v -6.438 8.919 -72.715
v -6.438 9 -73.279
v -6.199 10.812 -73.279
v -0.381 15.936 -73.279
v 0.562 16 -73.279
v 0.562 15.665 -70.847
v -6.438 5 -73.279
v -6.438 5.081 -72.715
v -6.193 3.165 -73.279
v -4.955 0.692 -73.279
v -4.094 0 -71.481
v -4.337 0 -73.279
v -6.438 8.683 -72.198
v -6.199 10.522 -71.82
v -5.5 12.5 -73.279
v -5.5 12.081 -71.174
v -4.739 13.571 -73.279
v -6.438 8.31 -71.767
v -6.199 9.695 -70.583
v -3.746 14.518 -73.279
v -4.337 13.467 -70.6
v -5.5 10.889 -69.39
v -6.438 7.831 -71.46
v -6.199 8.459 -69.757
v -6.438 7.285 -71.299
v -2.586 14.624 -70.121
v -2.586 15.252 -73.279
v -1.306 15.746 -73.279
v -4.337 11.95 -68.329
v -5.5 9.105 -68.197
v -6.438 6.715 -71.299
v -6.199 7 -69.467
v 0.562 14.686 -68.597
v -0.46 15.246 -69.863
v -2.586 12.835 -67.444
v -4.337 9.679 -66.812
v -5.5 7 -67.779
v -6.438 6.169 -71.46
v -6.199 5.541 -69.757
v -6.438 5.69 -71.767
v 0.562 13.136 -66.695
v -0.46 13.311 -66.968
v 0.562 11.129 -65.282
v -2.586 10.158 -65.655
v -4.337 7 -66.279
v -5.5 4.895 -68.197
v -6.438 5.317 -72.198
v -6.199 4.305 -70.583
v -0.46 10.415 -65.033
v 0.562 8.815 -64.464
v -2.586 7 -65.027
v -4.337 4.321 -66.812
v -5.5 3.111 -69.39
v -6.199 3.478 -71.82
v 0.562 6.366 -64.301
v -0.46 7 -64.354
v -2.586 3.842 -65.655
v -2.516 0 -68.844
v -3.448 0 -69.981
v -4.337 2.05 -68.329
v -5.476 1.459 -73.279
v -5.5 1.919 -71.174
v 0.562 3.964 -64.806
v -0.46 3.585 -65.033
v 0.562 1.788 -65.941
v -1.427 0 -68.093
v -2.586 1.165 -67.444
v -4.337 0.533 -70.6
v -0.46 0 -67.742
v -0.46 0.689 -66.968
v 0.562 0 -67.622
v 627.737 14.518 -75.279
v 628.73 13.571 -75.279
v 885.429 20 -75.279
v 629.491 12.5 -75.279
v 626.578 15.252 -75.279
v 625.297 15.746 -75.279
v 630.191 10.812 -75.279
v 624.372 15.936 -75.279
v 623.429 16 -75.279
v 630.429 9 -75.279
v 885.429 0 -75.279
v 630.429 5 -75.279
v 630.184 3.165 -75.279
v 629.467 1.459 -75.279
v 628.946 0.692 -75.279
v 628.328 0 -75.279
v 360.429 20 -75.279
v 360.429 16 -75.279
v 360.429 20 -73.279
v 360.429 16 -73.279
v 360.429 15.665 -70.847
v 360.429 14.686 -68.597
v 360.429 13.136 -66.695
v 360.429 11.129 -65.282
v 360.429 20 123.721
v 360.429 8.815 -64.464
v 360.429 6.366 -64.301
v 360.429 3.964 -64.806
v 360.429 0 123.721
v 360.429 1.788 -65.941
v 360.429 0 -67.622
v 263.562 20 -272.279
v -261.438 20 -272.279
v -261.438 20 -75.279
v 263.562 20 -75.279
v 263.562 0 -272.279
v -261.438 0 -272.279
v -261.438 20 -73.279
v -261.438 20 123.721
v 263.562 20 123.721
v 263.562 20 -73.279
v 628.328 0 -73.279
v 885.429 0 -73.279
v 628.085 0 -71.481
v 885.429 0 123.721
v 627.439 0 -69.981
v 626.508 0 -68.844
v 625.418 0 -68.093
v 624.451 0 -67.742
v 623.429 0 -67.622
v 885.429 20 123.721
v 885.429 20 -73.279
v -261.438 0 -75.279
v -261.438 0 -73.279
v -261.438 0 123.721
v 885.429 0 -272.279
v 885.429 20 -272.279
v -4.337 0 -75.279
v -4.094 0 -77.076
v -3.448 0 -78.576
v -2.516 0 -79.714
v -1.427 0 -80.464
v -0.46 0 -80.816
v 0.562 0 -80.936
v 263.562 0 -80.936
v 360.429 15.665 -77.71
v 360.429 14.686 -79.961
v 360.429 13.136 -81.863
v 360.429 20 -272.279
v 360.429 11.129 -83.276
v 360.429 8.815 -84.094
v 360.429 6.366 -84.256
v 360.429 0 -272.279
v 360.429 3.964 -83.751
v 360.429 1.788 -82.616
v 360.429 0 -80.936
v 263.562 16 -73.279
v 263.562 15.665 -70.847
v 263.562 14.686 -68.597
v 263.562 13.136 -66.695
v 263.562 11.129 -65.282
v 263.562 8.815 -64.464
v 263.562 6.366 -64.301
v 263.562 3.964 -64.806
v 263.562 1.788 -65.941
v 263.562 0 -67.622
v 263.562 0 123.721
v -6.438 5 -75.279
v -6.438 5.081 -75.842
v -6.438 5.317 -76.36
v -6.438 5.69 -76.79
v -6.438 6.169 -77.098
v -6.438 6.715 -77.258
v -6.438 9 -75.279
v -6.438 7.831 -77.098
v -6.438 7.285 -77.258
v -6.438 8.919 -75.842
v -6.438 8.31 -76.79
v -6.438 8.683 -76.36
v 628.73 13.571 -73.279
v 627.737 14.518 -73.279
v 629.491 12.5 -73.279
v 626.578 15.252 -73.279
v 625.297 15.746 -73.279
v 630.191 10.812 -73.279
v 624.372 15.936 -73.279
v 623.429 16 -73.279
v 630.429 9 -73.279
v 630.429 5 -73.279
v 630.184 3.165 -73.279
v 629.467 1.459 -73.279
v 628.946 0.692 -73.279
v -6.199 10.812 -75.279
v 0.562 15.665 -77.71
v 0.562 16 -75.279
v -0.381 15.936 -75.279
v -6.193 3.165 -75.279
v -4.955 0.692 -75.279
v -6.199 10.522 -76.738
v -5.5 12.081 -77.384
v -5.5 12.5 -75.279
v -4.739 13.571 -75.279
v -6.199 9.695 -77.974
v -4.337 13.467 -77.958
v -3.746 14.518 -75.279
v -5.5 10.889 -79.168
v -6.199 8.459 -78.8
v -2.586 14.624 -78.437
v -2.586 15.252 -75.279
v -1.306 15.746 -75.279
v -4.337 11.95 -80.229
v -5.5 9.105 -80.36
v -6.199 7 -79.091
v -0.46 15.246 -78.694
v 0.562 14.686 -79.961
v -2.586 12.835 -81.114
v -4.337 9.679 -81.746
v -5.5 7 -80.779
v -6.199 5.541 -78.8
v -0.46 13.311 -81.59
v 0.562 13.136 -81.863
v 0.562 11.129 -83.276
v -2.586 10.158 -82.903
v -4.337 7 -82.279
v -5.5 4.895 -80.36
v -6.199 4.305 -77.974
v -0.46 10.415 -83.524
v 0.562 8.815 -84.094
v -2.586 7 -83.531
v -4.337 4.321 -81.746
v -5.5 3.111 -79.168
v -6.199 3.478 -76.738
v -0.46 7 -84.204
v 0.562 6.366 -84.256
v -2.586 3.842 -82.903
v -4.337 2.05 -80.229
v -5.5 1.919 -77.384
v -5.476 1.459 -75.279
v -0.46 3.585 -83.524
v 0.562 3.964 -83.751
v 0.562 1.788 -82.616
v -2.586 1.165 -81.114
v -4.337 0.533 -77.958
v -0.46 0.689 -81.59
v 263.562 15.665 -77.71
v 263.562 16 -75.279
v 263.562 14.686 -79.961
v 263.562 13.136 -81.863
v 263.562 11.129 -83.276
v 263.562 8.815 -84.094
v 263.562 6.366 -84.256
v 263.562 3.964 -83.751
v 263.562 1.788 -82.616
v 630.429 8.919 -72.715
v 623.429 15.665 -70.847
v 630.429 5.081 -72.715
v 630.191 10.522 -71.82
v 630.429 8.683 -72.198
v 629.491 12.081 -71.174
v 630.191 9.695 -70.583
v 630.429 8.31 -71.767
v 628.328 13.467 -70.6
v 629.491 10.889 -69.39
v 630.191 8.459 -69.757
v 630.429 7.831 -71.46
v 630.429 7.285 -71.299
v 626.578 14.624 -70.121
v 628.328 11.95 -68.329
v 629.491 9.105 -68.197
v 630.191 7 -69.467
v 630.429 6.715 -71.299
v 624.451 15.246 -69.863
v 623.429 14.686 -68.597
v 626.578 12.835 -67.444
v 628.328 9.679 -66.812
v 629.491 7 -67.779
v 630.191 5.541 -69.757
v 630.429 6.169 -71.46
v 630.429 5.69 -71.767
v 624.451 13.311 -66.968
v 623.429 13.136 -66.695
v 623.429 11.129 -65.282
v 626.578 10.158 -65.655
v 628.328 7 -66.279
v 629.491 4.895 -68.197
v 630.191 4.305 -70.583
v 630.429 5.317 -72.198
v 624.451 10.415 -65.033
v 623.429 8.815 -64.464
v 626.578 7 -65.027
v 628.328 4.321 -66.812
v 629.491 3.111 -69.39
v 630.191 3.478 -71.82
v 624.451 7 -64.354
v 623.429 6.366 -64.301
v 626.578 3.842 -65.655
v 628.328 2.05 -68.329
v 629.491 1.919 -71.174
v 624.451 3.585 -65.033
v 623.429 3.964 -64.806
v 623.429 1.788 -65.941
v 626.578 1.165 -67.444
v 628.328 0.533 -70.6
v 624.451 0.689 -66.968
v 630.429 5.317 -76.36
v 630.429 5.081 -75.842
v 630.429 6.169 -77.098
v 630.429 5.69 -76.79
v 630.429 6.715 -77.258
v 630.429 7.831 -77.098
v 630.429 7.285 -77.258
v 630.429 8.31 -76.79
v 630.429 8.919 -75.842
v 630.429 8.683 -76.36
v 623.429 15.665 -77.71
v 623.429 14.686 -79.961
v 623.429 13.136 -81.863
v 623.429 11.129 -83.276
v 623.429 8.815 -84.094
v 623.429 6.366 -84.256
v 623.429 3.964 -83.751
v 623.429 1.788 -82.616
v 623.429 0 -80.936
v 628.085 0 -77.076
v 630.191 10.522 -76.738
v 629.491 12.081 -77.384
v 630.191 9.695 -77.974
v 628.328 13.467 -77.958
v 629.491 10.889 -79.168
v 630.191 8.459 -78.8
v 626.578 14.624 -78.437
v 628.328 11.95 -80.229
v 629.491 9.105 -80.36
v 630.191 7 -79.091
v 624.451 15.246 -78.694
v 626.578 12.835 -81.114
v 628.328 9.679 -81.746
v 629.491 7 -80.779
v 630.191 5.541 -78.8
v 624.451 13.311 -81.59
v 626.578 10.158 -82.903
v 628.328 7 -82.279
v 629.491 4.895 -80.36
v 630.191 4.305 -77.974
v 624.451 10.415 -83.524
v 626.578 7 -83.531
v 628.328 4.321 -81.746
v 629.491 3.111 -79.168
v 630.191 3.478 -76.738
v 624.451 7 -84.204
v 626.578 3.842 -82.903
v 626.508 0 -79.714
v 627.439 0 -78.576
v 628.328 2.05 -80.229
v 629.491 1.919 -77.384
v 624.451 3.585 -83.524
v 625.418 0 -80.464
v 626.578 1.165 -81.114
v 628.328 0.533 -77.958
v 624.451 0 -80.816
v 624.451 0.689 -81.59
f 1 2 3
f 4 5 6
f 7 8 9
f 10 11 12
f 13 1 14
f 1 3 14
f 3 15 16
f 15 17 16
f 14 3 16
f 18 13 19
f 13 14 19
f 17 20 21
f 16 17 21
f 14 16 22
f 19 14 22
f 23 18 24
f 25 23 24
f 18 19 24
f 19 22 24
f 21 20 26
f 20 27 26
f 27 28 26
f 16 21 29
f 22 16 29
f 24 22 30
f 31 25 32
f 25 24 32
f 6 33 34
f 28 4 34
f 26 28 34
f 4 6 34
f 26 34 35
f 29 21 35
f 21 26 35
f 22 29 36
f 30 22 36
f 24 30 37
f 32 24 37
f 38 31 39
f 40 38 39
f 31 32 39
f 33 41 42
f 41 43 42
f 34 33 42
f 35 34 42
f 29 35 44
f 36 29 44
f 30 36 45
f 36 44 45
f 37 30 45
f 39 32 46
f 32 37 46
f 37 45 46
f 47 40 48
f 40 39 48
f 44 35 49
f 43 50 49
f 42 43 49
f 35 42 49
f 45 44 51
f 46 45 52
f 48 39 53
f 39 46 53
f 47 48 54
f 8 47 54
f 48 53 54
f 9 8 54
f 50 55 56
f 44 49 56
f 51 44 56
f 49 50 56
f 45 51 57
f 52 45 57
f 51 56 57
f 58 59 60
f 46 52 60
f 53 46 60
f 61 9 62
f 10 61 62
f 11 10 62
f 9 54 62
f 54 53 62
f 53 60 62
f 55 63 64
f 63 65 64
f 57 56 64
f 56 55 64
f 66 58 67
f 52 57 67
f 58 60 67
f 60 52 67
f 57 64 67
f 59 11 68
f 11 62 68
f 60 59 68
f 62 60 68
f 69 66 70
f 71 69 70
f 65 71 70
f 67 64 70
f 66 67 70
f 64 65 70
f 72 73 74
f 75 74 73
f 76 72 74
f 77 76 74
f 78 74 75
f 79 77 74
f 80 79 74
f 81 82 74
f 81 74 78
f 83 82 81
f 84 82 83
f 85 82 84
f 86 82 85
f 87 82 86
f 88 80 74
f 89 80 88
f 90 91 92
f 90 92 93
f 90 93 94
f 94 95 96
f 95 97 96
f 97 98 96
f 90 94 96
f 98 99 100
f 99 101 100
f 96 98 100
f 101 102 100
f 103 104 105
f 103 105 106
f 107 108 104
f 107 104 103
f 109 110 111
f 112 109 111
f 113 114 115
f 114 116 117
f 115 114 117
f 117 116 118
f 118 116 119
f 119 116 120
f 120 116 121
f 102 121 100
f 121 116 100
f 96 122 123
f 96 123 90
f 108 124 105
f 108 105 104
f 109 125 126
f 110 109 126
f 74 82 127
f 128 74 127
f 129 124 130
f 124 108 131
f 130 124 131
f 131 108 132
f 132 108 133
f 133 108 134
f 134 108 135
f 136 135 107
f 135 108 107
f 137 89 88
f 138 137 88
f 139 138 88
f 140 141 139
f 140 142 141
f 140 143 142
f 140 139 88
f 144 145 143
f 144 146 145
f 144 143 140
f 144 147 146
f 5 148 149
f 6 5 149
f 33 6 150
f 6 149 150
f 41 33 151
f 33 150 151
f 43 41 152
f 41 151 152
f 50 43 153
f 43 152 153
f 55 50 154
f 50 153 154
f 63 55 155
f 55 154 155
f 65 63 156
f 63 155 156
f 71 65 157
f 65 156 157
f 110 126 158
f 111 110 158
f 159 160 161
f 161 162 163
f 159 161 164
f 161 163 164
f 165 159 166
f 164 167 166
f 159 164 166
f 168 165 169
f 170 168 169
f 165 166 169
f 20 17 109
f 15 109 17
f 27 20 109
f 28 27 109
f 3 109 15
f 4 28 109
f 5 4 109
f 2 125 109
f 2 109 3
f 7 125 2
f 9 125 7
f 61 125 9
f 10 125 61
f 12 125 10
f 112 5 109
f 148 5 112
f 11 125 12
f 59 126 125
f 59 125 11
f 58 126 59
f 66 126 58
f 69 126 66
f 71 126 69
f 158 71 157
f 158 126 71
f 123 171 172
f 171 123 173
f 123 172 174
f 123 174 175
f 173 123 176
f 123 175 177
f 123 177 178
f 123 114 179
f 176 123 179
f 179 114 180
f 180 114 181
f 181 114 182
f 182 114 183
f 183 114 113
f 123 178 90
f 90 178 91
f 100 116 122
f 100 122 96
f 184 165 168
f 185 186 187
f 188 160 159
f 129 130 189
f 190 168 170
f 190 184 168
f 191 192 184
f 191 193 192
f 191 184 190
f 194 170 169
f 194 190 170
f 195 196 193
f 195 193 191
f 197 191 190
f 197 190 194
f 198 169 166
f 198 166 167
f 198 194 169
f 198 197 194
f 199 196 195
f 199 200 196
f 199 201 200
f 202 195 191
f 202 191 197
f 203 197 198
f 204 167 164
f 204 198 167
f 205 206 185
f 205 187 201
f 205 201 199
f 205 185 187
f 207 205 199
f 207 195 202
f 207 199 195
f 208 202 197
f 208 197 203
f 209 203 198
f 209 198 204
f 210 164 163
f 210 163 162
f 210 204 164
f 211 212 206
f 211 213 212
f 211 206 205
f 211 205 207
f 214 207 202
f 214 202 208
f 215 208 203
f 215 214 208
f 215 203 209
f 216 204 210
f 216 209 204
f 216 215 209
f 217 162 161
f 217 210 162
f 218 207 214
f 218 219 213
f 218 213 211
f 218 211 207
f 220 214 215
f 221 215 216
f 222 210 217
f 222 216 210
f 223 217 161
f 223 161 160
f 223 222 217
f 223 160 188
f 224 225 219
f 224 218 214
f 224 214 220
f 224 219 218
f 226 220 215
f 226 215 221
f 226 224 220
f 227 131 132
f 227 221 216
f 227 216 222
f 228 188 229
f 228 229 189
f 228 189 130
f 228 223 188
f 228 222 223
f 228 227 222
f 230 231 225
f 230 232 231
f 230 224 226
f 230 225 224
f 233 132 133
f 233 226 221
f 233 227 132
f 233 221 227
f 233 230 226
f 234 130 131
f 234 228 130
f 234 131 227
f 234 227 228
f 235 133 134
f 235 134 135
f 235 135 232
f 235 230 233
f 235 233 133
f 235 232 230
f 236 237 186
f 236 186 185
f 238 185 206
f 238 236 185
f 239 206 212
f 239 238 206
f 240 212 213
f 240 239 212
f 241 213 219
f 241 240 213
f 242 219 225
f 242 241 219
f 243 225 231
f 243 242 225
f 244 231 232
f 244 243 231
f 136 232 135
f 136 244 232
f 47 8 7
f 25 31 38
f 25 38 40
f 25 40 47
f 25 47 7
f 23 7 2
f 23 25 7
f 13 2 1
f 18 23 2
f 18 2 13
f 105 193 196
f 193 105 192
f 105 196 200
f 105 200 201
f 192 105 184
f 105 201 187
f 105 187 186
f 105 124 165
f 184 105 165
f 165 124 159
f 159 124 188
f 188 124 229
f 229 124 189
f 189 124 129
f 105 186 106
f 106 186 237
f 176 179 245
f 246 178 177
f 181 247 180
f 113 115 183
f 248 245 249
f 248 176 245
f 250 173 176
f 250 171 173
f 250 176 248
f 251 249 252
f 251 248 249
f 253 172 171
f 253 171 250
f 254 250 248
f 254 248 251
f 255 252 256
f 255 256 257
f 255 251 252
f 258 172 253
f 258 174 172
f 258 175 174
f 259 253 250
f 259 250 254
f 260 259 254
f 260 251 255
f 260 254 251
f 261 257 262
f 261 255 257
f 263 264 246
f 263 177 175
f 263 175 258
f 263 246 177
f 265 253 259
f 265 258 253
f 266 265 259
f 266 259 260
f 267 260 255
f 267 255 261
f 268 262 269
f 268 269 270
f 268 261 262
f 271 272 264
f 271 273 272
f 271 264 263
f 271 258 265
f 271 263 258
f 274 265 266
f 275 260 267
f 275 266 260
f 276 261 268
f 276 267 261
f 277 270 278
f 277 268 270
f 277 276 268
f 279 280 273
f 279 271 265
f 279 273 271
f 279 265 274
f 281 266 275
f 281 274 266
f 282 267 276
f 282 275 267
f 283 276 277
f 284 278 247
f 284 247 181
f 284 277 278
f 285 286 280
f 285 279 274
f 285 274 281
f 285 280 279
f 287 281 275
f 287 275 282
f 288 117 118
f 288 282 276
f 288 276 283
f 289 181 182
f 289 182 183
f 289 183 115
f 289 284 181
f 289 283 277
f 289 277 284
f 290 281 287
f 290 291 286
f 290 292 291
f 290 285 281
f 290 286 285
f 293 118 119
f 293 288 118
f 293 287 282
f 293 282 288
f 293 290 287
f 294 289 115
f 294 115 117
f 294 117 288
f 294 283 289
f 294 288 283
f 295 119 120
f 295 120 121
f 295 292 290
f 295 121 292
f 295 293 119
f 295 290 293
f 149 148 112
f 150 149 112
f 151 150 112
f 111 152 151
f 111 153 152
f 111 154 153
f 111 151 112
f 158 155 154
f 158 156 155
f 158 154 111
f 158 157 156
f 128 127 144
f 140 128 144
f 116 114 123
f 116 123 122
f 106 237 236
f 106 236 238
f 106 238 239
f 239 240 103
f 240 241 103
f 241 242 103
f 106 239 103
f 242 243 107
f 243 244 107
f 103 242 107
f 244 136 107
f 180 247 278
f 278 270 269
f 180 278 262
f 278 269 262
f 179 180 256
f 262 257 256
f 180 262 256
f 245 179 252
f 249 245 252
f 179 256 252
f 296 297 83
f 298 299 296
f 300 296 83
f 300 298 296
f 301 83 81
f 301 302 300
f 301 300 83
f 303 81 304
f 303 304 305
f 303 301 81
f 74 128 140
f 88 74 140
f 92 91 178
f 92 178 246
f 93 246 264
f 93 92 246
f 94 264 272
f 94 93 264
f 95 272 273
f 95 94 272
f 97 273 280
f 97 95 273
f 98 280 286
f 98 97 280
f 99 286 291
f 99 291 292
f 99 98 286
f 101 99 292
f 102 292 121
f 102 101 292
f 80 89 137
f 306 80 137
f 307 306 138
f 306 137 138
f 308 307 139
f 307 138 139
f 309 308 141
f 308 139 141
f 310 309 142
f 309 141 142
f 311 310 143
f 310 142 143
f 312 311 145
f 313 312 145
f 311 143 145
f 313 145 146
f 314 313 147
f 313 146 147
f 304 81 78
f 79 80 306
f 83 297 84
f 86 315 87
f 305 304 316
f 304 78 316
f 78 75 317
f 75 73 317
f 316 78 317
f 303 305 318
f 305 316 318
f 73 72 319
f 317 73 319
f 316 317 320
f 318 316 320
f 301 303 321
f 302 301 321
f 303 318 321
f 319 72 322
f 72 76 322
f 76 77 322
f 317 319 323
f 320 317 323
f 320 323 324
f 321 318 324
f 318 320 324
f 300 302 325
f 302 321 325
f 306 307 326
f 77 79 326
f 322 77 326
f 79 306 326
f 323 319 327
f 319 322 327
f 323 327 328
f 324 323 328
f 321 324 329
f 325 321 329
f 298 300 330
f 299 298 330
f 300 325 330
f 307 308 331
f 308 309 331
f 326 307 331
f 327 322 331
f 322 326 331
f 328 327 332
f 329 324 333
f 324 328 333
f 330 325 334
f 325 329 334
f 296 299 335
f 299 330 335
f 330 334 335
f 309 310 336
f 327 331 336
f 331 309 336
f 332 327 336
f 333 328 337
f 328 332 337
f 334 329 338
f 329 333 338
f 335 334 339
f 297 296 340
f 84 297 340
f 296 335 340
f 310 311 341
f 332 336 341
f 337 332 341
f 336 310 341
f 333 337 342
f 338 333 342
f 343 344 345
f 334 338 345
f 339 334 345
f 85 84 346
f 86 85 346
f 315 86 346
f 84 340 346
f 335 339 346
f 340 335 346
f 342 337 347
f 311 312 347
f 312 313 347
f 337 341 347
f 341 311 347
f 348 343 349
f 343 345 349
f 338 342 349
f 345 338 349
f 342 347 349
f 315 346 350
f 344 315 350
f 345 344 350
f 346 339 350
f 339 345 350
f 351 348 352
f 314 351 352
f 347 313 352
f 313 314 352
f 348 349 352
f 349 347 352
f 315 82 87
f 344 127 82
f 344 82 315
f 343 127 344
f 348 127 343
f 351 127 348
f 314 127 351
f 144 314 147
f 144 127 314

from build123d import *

# Parameters (mm, degrees)
F0_W     = 525
F0_H     = 197
F1_DEPTH = 20
F3_DEPTH = 270
F4_R     = 7


with BuildPart() as f1:
    # F0 (on Front) → F1 (new body)
    with BuildSketch(Plane.XZ):
        with Locations((1.0621380061, 25.221197979)):
            Rectangle(F0_W, F0_H)
    extrude(amount=-F1_DEPTH)

    # F2 (on face) → F3 (cut)
    with BuildSketch(Plane.YZ.offset(263.5621380061)):
        with BuildLine():
            ThreePointArc((0, -67.6219477715), (4, -81.7640833952), (16, -73.278802021))
            Line((16, -73.278802021), (0, -73.278802021))
            Line((0, -73.278802021), (0, -67.6219477715))
        make_face()
        with BuildLine():
            Line((0, -73.278802021), (16, -73.278802021))
            ThreePointArc((16, -73.278802021), (10, -64.7935206468), (0, -67.6219477715))
            Line((0, -67.6219477715), (0, -73.278802021))
        make_face()
    extrude(amount=-F3_DEPTH, mode=Mode.SUBTRACT)

    # F4
    f4_edges = [f1.edges().sort_by_distance(p)[0] for p in [
        (-6.437862, 10, -64.793521),
    ]]
    fillet(f4_edges, radius=F4_R)


with BuildPart() as f7_1:
    # F7: instance of F1
    add(f1.part.mirror(Plane(origin=(-53.484370932, 25, -74.278802021), x_dir=(1, 0, 0), z_dir=(0, 0, 1))))


with BuildPart() as f10_1:
    # F10: instance of F1
    add(f1.part.mirror(Plane(origin=(311.9956552982, 12.5, -58.2793839276), x_dir=(0, 0, -1), z_dir=(1, 0, 0))))


with BuildPart() as f10_2:
    # F10: instance of F7_1
    add(f7_1.part.mirror(Plane(origin=(311.9956552982, 12.5, -58.2793839276), x_dir=(0, 0, -1), z_dir=(1, 0, 0))))


solid = Compound([f1.part, f7_1.part, f10_1.part, f10_2.part])
